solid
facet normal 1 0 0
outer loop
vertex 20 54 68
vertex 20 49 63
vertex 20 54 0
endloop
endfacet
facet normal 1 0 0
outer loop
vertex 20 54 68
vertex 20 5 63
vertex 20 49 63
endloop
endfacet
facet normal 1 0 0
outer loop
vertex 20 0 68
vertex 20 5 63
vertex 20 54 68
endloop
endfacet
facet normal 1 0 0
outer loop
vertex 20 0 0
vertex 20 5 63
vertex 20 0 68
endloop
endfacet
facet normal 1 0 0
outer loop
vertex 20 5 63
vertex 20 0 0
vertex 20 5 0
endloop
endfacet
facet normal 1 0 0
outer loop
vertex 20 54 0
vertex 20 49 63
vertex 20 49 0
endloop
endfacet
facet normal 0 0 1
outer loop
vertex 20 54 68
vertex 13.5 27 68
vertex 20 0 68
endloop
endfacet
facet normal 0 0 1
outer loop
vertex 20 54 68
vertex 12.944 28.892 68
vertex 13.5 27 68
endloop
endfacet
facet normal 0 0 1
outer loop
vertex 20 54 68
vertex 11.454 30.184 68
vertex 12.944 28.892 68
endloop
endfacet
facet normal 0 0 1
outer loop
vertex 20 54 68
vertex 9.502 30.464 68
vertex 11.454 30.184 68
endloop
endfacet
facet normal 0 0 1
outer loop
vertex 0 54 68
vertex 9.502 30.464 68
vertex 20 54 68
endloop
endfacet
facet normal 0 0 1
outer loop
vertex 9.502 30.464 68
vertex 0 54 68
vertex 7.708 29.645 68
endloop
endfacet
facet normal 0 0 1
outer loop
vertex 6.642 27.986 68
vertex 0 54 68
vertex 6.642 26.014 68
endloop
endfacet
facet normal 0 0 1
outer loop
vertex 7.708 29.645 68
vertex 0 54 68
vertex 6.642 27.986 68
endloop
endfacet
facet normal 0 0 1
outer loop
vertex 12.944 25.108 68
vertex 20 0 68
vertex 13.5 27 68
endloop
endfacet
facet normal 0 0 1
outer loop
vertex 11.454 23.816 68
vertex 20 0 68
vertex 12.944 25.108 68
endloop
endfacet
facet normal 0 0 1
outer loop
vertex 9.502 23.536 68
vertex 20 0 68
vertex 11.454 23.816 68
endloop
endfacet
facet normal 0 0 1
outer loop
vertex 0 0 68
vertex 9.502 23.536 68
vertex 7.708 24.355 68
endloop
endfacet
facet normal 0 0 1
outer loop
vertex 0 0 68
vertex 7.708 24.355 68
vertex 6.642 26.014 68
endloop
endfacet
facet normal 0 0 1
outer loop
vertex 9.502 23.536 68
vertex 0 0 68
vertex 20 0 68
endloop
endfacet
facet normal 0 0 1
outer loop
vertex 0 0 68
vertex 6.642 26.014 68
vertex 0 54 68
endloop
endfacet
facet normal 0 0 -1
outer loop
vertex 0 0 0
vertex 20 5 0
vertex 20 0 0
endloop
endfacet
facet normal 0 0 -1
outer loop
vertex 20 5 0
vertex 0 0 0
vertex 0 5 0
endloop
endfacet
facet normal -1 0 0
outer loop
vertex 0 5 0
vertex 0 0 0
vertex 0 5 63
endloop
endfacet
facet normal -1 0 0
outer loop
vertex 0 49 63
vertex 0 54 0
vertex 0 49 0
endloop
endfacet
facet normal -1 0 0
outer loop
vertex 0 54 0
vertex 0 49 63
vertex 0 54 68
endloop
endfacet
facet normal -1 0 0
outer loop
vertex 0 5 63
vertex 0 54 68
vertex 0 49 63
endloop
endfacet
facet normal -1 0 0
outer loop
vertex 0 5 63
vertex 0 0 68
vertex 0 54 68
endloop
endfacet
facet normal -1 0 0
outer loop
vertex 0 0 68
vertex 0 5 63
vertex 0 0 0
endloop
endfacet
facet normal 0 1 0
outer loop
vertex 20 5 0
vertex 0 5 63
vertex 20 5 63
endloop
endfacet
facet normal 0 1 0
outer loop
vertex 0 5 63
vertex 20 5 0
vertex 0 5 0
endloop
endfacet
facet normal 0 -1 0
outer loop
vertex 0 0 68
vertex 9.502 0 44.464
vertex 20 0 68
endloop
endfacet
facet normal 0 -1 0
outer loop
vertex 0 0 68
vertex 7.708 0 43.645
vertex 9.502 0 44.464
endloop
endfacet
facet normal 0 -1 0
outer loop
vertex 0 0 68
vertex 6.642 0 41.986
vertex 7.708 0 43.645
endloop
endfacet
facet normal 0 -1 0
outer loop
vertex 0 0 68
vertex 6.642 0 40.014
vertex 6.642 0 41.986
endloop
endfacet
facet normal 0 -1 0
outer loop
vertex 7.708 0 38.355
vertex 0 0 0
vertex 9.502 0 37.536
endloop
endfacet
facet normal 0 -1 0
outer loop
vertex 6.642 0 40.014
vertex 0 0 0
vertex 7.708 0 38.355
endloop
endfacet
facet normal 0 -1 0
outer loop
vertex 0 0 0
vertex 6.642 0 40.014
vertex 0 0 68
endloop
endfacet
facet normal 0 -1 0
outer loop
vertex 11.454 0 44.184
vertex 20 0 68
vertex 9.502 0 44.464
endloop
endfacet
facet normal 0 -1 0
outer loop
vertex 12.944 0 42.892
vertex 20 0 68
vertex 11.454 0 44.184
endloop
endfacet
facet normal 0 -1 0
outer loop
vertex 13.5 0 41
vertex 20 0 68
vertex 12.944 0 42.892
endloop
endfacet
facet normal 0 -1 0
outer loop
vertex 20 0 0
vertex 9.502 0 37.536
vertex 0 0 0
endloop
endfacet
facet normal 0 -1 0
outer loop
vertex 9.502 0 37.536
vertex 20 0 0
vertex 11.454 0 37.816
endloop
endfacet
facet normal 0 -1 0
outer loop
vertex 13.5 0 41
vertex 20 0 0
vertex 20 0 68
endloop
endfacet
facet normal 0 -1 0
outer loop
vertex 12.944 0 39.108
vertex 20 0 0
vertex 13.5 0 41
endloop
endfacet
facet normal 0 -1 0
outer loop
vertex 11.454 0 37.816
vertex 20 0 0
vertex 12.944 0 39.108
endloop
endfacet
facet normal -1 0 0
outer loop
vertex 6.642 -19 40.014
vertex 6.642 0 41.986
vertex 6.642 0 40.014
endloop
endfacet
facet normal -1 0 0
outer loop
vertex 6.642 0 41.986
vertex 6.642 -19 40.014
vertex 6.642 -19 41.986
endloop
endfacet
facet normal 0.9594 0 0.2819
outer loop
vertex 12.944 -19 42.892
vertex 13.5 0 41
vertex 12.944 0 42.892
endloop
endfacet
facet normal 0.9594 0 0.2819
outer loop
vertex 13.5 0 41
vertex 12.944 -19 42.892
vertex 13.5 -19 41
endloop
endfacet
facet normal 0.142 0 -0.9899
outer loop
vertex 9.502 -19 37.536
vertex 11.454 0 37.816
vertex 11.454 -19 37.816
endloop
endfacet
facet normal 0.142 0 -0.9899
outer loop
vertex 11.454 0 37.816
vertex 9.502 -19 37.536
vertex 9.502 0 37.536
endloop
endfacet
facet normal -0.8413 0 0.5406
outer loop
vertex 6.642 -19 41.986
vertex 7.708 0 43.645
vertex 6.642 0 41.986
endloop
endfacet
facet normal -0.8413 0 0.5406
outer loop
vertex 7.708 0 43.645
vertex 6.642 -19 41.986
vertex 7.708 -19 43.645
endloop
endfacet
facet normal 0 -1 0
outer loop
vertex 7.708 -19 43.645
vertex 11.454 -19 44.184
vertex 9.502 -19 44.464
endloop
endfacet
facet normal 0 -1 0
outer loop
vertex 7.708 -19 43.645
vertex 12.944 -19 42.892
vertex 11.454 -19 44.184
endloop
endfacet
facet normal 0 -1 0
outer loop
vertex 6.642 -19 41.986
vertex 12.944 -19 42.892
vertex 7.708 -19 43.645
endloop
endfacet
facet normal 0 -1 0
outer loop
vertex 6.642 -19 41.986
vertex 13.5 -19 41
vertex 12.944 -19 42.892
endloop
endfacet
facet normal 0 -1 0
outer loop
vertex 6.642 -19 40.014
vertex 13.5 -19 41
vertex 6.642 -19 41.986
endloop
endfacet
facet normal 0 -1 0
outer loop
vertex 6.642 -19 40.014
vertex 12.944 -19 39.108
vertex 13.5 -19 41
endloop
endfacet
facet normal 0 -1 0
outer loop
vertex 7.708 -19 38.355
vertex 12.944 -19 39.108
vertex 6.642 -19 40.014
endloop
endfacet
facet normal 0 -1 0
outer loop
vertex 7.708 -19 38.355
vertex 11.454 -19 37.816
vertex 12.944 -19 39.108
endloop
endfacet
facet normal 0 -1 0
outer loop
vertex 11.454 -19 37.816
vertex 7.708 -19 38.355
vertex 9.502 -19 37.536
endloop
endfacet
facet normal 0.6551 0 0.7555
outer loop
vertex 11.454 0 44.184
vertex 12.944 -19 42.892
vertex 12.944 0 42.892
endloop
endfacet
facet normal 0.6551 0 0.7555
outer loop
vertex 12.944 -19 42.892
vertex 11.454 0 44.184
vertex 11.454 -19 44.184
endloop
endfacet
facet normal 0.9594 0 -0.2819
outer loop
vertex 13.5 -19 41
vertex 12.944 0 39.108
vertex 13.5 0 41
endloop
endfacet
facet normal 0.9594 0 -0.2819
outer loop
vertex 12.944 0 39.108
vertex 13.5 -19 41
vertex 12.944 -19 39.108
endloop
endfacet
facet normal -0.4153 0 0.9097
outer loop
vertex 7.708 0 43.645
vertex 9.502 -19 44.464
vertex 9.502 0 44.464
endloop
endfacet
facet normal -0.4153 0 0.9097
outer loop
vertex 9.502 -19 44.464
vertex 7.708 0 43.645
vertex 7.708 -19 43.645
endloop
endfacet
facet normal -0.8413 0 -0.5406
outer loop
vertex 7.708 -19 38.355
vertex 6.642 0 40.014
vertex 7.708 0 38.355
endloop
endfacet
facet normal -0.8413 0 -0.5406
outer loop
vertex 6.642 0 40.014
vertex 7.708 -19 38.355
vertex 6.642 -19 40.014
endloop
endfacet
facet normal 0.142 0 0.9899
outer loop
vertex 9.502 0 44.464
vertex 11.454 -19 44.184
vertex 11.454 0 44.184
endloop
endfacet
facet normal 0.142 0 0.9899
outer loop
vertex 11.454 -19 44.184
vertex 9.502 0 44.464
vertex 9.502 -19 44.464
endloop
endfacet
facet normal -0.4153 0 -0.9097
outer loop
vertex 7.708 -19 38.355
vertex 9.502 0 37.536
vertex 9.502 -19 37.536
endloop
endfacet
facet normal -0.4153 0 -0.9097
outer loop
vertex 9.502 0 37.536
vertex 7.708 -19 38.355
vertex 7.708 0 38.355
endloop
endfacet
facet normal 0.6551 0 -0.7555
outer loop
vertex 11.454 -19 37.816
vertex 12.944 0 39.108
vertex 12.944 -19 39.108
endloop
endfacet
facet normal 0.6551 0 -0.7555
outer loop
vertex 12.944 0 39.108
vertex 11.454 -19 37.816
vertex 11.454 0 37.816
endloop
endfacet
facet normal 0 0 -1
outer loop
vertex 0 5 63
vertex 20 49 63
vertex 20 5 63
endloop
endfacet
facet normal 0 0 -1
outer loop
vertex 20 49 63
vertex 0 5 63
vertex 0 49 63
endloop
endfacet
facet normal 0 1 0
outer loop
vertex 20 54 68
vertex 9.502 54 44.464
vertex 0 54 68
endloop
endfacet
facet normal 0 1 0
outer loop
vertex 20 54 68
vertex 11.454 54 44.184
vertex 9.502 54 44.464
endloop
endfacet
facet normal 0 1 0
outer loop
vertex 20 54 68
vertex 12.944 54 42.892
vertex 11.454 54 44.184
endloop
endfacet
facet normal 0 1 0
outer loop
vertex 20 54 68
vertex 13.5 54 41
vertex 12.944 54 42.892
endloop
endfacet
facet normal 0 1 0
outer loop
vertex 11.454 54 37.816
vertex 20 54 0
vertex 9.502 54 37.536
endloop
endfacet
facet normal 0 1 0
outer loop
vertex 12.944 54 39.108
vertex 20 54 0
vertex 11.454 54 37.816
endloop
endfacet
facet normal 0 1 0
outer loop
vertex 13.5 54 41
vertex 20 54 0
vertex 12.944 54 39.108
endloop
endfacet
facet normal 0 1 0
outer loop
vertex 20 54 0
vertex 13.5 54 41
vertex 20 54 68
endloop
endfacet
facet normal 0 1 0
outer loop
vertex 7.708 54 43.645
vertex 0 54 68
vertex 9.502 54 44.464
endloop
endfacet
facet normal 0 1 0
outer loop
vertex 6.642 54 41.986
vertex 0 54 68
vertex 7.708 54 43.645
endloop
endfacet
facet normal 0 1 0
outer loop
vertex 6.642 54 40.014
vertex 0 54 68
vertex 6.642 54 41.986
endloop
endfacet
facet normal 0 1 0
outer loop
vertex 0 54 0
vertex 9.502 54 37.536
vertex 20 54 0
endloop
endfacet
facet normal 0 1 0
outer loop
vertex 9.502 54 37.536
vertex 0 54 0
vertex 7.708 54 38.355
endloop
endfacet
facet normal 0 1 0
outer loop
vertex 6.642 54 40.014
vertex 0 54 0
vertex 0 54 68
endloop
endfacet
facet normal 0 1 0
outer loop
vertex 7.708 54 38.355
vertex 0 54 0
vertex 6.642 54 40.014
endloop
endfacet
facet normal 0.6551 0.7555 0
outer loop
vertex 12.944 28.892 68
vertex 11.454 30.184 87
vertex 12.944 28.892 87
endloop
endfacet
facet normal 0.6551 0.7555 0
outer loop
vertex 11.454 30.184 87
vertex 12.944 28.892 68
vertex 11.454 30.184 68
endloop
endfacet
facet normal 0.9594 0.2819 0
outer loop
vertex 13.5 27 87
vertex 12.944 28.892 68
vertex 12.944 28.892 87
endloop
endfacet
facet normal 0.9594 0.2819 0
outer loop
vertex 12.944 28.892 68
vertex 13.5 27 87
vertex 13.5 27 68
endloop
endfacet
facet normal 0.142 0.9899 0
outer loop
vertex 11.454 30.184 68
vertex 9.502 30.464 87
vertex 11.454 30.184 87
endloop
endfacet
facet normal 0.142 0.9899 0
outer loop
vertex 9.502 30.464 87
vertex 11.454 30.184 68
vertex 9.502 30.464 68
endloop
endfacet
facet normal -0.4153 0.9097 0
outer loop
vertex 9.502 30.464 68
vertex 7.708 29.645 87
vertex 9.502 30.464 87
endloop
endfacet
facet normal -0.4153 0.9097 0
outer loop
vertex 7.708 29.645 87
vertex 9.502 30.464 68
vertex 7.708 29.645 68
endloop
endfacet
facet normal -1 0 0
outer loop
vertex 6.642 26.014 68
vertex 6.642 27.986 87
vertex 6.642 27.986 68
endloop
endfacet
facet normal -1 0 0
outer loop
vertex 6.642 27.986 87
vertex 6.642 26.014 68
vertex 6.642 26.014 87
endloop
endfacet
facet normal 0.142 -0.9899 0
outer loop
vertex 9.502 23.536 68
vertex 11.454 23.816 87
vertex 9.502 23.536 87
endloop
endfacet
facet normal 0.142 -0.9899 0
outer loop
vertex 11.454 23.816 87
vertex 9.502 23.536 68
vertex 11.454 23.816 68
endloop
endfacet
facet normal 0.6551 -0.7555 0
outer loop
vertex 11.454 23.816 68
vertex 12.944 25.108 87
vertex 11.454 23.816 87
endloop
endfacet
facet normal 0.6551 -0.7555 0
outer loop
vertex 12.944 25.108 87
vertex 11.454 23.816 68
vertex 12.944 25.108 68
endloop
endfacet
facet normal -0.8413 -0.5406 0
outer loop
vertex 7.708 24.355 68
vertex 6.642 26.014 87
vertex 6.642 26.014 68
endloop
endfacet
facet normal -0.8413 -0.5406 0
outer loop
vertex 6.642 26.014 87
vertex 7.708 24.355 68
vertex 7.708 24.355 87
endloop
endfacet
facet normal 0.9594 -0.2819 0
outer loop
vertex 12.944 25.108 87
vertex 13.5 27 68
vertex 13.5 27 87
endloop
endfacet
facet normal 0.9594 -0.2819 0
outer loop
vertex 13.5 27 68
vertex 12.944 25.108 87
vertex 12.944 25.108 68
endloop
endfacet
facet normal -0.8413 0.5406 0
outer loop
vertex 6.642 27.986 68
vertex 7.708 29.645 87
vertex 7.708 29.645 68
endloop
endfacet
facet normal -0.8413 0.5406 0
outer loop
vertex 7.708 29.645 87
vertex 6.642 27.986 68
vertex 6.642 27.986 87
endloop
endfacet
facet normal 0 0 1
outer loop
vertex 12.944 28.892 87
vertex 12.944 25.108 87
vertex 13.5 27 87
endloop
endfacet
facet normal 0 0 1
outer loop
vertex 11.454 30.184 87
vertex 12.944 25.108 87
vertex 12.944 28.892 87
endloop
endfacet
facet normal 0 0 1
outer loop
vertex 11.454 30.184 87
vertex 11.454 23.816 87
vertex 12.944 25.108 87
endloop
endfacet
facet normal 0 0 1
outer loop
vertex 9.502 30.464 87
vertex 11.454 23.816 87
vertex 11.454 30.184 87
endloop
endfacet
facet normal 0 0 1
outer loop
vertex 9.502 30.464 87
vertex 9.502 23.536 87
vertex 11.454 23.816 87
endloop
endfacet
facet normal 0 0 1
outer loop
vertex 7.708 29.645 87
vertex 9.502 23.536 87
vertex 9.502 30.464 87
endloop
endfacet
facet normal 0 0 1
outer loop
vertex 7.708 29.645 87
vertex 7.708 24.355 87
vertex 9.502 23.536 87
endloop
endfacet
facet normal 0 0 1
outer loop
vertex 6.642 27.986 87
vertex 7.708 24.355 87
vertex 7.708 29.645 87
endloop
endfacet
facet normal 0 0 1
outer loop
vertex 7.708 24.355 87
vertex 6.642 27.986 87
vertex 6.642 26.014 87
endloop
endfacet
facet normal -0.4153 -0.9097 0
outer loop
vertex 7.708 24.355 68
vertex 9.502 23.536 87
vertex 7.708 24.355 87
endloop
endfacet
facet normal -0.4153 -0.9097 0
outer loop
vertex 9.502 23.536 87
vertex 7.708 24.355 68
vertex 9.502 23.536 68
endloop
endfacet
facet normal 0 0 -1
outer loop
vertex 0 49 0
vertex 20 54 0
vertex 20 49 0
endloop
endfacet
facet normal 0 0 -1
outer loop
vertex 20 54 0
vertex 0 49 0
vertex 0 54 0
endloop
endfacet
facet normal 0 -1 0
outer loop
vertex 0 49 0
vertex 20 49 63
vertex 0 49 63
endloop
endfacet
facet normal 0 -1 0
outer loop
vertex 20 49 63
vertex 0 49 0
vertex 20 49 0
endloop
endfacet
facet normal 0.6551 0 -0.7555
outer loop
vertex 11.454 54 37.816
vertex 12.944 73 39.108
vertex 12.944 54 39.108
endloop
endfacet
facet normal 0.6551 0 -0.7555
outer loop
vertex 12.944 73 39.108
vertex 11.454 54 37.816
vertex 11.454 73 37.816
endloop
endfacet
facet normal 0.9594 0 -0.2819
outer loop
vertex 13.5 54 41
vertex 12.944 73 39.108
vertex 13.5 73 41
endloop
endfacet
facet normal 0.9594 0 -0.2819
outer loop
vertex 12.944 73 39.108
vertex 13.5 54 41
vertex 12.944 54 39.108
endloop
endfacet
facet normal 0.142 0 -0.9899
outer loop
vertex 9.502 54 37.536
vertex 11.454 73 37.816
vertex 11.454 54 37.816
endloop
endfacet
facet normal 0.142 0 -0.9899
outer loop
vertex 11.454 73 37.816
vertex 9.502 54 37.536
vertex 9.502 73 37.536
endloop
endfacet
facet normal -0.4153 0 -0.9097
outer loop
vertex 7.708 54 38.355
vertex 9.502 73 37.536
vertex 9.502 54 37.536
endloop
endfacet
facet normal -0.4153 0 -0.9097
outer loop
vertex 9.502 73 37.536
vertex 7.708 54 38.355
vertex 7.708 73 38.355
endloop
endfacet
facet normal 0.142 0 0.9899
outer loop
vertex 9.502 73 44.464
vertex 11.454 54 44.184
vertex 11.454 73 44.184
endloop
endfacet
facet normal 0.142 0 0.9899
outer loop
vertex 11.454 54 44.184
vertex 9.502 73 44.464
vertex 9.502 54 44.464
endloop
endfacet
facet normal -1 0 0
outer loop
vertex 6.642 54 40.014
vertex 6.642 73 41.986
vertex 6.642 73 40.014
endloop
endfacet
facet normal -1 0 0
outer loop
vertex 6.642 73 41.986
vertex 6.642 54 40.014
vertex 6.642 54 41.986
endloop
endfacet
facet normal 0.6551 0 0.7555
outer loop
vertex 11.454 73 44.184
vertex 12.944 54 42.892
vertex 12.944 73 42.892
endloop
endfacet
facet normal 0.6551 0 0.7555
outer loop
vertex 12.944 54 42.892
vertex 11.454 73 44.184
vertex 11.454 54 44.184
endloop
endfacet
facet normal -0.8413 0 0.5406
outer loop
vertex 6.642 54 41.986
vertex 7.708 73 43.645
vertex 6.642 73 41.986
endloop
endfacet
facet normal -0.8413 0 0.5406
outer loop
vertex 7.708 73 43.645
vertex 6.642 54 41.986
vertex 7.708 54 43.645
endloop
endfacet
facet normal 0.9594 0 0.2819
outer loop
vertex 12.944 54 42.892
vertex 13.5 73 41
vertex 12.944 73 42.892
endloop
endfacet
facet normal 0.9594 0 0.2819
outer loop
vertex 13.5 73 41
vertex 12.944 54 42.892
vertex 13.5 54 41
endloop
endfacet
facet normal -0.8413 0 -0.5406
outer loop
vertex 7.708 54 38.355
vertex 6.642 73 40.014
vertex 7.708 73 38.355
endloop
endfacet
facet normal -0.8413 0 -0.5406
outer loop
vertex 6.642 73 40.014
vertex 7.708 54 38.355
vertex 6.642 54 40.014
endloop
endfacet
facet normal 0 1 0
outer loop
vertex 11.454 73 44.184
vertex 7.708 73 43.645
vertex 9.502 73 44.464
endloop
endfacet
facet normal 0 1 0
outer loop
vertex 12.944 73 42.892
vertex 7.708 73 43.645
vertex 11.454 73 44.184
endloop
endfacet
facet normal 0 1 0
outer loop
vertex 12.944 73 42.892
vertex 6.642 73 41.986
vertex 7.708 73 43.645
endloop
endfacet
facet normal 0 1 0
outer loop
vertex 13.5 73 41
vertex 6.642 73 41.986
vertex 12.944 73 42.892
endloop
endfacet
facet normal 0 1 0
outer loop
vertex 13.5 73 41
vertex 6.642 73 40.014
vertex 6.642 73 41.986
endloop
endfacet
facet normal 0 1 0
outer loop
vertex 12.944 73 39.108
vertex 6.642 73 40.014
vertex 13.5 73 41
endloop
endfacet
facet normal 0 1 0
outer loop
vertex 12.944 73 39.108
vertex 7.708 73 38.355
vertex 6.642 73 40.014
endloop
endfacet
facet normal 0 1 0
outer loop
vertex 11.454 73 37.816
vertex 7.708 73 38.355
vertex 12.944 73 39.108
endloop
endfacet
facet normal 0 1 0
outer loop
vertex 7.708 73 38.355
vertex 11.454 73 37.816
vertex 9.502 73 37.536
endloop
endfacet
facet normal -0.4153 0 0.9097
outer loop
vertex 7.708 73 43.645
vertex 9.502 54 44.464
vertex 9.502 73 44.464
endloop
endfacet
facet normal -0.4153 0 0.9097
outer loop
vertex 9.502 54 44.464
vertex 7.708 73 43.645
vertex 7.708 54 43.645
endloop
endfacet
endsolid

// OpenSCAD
union() {
	union() {
		cube(size = [20, 5, 68]);
		translate(v = [10, 1, 41]) {
			rotate(a = 90, v = [1, 0, 0]) {
				cylinder(h = 20, r = 3.5000000000);
			}
		}
		translate(v = [0, 0, 63]) {
			cube(size = [20, 54, 5]);
		}
		translate(v = [10, 27, 67]) {
			cylinder(h = 20, r = 3.5000000000);
		}
		translate(v = [0, 49, 0]) {
			cube(size = [20, 5, 68]);
		}
		translate(v = [10, 53, 41]) {
			rotate(a = -90, v = [1, 0, 0]) {
				cylinder(h = 20, r = 3.5000000000);
			}
		}
	}
}
